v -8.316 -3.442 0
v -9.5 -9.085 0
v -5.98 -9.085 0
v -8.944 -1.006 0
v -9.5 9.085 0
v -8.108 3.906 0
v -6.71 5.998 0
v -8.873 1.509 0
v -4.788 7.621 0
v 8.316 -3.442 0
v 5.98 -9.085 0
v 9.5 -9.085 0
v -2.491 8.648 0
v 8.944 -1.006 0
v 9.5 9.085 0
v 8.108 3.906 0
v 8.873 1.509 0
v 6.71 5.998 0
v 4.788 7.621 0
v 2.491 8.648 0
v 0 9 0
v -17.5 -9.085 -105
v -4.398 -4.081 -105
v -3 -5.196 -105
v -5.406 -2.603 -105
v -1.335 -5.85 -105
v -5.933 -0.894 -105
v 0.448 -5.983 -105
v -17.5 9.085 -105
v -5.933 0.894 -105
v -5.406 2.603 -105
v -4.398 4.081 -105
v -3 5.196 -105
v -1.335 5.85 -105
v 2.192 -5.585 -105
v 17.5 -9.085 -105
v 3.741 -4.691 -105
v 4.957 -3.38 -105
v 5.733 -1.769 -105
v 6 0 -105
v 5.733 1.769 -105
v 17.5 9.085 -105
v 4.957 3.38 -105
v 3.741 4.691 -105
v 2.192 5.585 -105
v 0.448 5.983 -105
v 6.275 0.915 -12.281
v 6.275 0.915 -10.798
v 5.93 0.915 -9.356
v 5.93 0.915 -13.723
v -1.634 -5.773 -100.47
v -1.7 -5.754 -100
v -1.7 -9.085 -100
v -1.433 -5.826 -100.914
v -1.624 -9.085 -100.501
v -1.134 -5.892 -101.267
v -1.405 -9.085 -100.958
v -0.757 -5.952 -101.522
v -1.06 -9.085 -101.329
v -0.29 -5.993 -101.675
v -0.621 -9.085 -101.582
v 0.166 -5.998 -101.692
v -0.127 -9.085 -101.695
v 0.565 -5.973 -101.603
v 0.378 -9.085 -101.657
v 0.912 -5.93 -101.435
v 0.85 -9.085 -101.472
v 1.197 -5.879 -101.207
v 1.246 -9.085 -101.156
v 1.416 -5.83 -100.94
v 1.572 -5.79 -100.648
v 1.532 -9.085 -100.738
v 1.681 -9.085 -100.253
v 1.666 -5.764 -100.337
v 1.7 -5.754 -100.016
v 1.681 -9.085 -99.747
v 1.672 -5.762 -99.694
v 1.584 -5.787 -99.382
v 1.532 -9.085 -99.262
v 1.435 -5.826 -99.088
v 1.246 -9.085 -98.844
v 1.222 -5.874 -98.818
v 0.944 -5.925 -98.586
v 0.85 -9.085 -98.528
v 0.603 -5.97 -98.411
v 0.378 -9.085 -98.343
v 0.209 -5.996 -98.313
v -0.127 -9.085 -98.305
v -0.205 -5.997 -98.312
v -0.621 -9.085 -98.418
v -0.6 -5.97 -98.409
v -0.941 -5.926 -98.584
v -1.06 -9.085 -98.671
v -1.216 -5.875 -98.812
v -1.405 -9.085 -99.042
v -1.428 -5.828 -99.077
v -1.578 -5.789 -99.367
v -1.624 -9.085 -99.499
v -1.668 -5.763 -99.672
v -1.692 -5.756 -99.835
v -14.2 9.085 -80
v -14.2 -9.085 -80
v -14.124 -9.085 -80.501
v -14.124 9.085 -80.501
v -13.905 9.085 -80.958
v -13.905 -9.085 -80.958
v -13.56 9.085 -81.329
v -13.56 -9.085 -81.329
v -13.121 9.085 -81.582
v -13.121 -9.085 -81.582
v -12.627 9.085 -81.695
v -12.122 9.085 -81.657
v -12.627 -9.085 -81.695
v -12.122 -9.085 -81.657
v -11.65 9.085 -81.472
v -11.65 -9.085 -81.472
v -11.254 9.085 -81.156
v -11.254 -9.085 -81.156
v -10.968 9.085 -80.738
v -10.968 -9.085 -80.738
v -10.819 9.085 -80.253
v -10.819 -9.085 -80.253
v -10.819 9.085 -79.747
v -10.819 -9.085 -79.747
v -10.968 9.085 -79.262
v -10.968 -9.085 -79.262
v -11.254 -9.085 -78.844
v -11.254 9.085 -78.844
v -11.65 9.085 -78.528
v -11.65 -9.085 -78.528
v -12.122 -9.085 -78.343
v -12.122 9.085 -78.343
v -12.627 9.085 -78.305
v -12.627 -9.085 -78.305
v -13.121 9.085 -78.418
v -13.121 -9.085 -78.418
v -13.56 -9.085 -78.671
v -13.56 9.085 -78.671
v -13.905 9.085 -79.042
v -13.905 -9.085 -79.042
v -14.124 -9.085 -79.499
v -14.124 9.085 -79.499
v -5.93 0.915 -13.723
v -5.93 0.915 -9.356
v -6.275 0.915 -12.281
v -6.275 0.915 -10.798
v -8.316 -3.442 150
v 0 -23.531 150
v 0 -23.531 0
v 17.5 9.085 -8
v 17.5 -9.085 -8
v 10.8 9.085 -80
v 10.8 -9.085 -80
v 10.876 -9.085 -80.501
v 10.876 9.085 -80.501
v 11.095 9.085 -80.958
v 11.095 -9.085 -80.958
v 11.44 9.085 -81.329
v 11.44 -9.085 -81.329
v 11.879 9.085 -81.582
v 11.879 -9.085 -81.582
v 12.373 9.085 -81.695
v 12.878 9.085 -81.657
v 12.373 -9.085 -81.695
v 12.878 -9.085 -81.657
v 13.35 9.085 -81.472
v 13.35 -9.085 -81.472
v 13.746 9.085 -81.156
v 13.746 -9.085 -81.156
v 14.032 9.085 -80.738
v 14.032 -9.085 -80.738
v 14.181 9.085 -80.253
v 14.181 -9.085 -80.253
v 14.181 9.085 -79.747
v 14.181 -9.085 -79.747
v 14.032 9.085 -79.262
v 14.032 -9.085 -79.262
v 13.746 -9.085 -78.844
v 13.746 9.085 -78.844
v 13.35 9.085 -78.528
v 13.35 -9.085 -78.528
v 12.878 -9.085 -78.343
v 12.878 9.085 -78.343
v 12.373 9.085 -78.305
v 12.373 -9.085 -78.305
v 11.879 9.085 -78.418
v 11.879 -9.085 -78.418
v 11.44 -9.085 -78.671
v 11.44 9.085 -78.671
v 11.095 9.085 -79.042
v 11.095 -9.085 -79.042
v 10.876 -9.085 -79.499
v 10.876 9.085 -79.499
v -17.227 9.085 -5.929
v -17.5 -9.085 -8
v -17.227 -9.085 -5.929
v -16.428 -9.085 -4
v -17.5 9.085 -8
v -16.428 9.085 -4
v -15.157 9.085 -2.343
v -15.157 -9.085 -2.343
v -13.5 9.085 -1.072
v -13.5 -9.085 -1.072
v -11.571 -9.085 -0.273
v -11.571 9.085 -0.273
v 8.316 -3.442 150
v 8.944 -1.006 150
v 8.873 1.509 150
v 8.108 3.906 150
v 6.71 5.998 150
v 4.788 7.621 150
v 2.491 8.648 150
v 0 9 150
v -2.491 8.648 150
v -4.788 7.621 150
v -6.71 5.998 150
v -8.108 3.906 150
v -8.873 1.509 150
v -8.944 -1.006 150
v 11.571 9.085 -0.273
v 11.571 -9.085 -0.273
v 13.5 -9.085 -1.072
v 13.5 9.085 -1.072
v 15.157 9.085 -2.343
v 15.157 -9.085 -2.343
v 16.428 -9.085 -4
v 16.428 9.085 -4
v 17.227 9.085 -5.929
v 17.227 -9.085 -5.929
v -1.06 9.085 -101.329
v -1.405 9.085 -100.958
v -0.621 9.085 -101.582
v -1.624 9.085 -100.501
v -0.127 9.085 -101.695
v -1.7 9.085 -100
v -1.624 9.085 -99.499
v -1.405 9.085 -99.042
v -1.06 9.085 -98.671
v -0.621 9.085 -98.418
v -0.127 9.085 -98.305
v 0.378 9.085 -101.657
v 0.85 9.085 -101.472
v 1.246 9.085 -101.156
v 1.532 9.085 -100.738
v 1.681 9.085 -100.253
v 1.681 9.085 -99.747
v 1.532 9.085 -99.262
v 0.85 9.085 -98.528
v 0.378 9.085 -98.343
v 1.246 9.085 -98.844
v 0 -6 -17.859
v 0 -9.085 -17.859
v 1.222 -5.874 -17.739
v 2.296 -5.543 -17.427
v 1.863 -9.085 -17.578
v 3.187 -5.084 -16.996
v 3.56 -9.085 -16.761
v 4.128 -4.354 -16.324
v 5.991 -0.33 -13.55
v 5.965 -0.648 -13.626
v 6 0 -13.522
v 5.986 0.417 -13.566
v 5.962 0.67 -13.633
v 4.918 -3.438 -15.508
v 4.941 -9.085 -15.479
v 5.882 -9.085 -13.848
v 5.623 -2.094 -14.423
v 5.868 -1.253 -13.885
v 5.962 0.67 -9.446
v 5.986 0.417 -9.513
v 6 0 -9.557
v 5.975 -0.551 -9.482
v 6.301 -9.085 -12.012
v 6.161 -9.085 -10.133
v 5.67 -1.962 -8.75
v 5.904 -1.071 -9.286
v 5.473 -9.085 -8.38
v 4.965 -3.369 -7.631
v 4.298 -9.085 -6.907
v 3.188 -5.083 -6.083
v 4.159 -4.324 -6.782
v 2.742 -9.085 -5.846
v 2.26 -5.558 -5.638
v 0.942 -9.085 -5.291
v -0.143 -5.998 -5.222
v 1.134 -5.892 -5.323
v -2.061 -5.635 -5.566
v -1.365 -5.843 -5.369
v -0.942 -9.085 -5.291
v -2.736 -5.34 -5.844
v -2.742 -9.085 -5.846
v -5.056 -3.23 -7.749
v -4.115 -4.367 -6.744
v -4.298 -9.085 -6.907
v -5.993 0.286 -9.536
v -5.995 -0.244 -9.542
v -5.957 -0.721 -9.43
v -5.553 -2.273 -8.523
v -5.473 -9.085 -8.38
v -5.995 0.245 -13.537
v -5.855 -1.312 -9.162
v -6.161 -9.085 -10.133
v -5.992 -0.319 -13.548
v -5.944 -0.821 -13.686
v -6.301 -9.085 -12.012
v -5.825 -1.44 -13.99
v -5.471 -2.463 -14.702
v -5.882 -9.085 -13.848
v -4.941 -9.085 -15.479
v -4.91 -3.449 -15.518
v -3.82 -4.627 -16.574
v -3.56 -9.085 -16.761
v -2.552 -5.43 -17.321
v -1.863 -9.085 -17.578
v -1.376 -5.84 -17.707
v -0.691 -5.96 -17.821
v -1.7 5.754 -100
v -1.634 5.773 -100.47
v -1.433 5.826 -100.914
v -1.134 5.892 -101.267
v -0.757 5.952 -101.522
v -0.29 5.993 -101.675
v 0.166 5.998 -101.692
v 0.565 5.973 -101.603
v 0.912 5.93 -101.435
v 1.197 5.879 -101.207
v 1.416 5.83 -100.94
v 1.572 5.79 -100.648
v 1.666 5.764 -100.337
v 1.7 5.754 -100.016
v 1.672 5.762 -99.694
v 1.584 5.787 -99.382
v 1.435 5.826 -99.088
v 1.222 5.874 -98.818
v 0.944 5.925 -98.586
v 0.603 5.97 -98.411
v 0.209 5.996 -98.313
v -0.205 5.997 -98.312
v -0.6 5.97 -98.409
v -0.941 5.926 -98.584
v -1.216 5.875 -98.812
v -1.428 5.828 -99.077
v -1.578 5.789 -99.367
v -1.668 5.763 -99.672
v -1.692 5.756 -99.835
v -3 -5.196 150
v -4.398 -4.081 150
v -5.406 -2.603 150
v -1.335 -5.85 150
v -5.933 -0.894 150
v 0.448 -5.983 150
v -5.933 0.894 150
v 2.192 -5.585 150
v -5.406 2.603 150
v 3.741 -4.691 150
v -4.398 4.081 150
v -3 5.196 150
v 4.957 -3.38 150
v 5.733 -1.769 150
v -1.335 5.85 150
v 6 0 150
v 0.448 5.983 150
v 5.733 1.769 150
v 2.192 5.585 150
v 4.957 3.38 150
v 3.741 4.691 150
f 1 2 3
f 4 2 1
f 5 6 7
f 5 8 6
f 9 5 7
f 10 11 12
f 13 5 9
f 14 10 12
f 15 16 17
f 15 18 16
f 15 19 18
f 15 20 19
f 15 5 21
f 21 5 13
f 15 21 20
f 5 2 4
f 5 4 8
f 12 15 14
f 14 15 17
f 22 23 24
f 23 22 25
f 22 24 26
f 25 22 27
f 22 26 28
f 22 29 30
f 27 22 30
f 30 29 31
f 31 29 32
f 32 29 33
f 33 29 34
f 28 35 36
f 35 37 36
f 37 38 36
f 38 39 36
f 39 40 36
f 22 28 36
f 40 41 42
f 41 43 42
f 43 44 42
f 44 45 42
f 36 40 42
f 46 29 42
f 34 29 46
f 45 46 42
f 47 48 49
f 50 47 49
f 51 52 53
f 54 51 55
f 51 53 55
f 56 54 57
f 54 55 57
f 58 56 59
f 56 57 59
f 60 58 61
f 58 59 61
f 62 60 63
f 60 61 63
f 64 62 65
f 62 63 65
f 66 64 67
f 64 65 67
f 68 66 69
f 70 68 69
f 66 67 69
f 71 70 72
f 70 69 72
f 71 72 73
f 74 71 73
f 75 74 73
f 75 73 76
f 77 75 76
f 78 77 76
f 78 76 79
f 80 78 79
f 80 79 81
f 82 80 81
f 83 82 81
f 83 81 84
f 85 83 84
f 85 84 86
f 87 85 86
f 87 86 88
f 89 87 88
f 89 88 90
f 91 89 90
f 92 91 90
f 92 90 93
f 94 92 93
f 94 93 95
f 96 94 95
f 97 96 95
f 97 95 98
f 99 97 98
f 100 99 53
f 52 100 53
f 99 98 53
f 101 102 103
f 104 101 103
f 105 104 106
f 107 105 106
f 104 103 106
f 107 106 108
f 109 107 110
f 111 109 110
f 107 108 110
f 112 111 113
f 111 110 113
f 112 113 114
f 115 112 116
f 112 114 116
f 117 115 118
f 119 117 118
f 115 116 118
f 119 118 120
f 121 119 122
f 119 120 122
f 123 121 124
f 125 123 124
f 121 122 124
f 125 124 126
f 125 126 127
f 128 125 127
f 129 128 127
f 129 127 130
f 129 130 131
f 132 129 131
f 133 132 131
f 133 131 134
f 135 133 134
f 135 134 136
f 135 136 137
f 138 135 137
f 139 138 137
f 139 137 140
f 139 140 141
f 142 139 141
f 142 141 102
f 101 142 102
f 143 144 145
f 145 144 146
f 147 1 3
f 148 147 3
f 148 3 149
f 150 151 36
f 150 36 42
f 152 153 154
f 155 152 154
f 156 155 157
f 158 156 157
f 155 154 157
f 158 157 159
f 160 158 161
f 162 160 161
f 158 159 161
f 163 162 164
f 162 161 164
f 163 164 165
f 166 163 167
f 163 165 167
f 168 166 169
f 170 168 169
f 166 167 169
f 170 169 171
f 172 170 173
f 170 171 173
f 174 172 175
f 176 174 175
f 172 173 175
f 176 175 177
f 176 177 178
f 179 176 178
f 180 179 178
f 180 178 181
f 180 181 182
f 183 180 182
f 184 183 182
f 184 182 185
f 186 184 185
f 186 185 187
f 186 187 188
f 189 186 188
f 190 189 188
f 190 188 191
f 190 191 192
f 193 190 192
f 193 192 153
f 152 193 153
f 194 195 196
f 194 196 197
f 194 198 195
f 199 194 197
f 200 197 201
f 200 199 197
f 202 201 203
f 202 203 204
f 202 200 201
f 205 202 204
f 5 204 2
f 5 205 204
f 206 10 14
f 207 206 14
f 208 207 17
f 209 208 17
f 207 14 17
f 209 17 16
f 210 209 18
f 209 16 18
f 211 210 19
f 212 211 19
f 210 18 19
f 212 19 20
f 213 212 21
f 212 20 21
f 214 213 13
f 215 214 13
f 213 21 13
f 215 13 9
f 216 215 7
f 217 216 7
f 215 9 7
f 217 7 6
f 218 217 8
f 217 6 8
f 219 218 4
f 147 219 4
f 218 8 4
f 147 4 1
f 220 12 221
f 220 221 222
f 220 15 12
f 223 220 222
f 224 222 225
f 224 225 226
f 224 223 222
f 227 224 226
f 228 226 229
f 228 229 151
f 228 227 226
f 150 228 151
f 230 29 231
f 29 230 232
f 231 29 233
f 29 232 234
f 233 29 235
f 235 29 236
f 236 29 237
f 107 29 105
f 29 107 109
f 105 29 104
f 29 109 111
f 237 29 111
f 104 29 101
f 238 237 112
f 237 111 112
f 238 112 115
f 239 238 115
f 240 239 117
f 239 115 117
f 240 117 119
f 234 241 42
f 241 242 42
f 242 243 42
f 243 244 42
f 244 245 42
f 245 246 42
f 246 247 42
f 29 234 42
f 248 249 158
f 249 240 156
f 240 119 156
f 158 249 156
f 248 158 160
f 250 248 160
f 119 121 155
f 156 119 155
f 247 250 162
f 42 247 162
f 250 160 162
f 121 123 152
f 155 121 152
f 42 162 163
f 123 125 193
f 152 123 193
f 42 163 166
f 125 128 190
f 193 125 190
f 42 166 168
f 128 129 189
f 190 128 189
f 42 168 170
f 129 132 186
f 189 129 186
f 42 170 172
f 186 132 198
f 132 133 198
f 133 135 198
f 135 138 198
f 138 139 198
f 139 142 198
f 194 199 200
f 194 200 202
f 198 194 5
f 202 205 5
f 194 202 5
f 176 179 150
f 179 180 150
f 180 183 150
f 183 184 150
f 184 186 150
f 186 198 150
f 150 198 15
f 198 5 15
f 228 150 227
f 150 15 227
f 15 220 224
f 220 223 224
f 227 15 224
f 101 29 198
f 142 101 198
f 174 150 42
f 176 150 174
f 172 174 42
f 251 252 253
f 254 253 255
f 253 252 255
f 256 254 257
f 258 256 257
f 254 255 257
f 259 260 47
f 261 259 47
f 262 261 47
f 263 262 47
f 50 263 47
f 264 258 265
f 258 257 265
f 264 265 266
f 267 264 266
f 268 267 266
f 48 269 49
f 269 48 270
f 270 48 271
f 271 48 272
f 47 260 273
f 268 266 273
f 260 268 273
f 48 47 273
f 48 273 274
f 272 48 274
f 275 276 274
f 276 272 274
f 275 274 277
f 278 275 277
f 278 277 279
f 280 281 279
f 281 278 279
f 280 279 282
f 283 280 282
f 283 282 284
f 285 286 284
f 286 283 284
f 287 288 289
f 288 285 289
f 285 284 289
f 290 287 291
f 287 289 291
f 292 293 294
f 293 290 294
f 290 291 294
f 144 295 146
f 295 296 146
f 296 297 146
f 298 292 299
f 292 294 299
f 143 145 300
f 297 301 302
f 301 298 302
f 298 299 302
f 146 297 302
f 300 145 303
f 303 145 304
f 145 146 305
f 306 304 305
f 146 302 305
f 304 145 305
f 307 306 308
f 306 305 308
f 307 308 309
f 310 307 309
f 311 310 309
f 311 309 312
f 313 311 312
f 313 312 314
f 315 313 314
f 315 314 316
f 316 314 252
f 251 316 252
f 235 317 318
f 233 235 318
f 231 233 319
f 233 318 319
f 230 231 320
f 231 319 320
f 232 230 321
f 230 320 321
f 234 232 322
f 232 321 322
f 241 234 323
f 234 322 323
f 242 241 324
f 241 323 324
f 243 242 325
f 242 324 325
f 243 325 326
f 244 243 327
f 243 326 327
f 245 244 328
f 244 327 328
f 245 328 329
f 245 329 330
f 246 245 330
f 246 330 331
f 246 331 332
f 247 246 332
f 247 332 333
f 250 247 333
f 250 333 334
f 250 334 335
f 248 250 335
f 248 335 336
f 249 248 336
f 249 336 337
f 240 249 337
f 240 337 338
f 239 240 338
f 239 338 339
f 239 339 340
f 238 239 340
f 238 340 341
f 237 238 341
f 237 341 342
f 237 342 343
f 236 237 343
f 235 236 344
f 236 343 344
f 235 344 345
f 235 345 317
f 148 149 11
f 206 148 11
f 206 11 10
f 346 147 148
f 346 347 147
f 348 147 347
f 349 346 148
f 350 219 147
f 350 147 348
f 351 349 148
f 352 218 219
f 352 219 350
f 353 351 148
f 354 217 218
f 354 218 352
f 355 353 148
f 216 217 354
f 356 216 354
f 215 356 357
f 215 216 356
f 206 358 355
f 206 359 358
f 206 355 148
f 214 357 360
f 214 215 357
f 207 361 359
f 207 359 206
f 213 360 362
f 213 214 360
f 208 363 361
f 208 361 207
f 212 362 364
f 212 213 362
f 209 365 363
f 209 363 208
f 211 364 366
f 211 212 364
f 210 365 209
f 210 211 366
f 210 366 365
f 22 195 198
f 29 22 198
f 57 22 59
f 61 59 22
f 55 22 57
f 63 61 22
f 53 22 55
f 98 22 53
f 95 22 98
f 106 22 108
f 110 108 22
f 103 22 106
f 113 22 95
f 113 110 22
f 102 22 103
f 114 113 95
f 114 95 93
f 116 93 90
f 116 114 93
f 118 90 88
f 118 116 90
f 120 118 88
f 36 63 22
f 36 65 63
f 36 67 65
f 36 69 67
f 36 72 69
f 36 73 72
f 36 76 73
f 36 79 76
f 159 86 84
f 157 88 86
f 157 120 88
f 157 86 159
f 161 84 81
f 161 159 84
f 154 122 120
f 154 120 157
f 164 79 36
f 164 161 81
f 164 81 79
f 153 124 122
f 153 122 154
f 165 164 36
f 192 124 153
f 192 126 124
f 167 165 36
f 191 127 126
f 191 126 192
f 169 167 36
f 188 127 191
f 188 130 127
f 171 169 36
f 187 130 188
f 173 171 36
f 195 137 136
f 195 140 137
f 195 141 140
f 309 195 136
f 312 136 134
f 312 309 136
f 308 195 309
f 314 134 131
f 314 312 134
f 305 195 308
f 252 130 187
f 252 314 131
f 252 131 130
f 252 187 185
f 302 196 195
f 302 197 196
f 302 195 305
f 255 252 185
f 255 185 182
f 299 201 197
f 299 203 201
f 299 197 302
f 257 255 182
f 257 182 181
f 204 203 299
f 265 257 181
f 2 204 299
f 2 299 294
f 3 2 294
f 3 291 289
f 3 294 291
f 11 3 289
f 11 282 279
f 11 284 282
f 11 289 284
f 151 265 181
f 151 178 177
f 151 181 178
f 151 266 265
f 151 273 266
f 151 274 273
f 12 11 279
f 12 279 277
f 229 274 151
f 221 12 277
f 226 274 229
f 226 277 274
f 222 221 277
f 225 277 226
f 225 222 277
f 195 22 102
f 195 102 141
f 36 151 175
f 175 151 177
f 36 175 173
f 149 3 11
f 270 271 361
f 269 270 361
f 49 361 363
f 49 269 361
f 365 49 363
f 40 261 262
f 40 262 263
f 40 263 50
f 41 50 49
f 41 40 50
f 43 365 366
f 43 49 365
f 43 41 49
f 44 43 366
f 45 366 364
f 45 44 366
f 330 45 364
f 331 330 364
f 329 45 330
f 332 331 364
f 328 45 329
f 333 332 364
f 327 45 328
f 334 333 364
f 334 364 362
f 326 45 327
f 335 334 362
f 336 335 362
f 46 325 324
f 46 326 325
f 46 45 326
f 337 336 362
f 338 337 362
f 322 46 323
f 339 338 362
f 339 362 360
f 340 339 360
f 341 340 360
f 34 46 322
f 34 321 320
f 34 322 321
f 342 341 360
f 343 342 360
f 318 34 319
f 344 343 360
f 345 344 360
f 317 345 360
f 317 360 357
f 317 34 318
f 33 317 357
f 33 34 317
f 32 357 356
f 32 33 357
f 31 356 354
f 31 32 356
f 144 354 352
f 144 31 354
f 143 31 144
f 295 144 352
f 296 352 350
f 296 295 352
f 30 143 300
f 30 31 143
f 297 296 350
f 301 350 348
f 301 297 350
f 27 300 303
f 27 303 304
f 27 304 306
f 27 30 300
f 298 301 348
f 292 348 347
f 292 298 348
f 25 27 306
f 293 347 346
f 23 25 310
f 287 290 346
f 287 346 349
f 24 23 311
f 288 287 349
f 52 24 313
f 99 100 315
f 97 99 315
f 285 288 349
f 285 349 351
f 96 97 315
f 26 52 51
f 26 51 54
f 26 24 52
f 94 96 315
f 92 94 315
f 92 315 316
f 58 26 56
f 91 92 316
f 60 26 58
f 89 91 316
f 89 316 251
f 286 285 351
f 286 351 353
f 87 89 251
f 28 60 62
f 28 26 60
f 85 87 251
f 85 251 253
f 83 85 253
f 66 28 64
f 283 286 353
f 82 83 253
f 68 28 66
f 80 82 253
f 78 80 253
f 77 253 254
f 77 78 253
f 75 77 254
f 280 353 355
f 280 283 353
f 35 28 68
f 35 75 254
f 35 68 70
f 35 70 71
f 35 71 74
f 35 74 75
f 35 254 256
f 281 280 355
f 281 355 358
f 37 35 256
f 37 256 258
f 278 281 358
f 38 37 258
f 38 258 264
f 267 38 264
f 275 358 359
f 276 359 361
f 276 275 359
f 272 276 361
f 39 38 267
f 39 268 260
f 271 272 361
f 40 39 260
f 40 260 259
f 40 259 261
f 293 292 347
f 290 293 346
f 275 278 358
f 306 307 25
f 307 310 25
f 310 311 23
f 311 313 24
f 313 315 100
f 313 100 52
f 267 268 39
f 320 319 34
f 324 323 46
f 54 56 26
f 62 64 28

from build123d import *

# Parameters (mm, degrees)
IZIM1_R                     = 6
Y_KSEKLIK_EKSTR_ZYON1_DEPTH = 150
IZIM2_W                     = 35
IZIM2_H                     = 18.169429668
Y_KSEKLIK_EKSTR_ZYON2_DEPTH = 105
RADYUS1_R                   = 8
M3_BO_LUKLU_DELIK1_D        = 3.4
KES_EKSTR_ZYON1_START       = -105
IZIM8_R                     = 6
KES_EKSTR_ZYON1_DEPTH       = 105
IZIM9_R                     = 6.319148562
KES_EKSTR_ZYON2_DEPTH       = 10


with BuildPart() as part:
    # Çizim1 → Yükseklik-Ekstrüzyon1 (new body)
    with BuildSketch(Plane.XY):
        with BuildLine():
            Line((0, -23.530781845), (8.315682398, -3.44229956))
            ThreePointArc((8.315682398, -3.44229956), (0, 9), (-8.315682398, -3.44229956))
            Line((-8.315682398, -3.44229956), (0, -23.530781845))
        make_face()
        Circle(IZIM1_R, mode=Mode.SUBTRACT)
    extrude(amount=Y_KSEKLIK_EKSTR_ZYON1_DEPTH)

    # Çizim2 → Yükseklik-Ekstrüzyon2 (add)
    with BuildSketch(Plane.XY):
        Rectangle(IZIM2_W, IZIM2_H)
    extrude(amount=-Y_KSEKLIK_EKSTR_ZYON2_DEPTH)

    # Radyus1
    radyus1_edges = [part.edges().sort_by_distance(p)[0] for p in [
        (17.5, 0, 0),
        (-17.5, 0, 0),
    ]]
    fillet(radyus1_edges, radius=RADYUS1_R)

    # M3 Boşluklu Delik1 (through all)
    with Locations(Plane(origin=(0, 9.084714834, 0), x_dir=(1, 0, 0), z_dir=(0, 1, 0))):
        with Locations((-12.5, 80), (12.5, 80), (0, 100)):
            Hole(M3_BO_LUKLU_DELIK1_D / 2)

    # Çizim8 → Kes-Ekstrüzyon1 (cut)
    with BuildSketch(Plane.XY.offset(KES_EKSTR_ZYON1_START)):
        Circle(IZIM8_R)
    extrude(amount=KES_EKSTR_ZYON1_DEPTH, mode=Mode.SUBTRACT)

    # Çizim9 → Kes-Ekstrüzyon2 (cut)
    with BuildSketch(Plane.XZ.offset(9.084714834)):
        with Locations(Location((0, -11.539481772, 0), (0, 0, 270))):
            Circle(IZIM9_R)
    extrude(amount=-KES_EKSTR_ZYON2_DEPTH, mode=Mode.SUBTRACT)


solid = part.part
